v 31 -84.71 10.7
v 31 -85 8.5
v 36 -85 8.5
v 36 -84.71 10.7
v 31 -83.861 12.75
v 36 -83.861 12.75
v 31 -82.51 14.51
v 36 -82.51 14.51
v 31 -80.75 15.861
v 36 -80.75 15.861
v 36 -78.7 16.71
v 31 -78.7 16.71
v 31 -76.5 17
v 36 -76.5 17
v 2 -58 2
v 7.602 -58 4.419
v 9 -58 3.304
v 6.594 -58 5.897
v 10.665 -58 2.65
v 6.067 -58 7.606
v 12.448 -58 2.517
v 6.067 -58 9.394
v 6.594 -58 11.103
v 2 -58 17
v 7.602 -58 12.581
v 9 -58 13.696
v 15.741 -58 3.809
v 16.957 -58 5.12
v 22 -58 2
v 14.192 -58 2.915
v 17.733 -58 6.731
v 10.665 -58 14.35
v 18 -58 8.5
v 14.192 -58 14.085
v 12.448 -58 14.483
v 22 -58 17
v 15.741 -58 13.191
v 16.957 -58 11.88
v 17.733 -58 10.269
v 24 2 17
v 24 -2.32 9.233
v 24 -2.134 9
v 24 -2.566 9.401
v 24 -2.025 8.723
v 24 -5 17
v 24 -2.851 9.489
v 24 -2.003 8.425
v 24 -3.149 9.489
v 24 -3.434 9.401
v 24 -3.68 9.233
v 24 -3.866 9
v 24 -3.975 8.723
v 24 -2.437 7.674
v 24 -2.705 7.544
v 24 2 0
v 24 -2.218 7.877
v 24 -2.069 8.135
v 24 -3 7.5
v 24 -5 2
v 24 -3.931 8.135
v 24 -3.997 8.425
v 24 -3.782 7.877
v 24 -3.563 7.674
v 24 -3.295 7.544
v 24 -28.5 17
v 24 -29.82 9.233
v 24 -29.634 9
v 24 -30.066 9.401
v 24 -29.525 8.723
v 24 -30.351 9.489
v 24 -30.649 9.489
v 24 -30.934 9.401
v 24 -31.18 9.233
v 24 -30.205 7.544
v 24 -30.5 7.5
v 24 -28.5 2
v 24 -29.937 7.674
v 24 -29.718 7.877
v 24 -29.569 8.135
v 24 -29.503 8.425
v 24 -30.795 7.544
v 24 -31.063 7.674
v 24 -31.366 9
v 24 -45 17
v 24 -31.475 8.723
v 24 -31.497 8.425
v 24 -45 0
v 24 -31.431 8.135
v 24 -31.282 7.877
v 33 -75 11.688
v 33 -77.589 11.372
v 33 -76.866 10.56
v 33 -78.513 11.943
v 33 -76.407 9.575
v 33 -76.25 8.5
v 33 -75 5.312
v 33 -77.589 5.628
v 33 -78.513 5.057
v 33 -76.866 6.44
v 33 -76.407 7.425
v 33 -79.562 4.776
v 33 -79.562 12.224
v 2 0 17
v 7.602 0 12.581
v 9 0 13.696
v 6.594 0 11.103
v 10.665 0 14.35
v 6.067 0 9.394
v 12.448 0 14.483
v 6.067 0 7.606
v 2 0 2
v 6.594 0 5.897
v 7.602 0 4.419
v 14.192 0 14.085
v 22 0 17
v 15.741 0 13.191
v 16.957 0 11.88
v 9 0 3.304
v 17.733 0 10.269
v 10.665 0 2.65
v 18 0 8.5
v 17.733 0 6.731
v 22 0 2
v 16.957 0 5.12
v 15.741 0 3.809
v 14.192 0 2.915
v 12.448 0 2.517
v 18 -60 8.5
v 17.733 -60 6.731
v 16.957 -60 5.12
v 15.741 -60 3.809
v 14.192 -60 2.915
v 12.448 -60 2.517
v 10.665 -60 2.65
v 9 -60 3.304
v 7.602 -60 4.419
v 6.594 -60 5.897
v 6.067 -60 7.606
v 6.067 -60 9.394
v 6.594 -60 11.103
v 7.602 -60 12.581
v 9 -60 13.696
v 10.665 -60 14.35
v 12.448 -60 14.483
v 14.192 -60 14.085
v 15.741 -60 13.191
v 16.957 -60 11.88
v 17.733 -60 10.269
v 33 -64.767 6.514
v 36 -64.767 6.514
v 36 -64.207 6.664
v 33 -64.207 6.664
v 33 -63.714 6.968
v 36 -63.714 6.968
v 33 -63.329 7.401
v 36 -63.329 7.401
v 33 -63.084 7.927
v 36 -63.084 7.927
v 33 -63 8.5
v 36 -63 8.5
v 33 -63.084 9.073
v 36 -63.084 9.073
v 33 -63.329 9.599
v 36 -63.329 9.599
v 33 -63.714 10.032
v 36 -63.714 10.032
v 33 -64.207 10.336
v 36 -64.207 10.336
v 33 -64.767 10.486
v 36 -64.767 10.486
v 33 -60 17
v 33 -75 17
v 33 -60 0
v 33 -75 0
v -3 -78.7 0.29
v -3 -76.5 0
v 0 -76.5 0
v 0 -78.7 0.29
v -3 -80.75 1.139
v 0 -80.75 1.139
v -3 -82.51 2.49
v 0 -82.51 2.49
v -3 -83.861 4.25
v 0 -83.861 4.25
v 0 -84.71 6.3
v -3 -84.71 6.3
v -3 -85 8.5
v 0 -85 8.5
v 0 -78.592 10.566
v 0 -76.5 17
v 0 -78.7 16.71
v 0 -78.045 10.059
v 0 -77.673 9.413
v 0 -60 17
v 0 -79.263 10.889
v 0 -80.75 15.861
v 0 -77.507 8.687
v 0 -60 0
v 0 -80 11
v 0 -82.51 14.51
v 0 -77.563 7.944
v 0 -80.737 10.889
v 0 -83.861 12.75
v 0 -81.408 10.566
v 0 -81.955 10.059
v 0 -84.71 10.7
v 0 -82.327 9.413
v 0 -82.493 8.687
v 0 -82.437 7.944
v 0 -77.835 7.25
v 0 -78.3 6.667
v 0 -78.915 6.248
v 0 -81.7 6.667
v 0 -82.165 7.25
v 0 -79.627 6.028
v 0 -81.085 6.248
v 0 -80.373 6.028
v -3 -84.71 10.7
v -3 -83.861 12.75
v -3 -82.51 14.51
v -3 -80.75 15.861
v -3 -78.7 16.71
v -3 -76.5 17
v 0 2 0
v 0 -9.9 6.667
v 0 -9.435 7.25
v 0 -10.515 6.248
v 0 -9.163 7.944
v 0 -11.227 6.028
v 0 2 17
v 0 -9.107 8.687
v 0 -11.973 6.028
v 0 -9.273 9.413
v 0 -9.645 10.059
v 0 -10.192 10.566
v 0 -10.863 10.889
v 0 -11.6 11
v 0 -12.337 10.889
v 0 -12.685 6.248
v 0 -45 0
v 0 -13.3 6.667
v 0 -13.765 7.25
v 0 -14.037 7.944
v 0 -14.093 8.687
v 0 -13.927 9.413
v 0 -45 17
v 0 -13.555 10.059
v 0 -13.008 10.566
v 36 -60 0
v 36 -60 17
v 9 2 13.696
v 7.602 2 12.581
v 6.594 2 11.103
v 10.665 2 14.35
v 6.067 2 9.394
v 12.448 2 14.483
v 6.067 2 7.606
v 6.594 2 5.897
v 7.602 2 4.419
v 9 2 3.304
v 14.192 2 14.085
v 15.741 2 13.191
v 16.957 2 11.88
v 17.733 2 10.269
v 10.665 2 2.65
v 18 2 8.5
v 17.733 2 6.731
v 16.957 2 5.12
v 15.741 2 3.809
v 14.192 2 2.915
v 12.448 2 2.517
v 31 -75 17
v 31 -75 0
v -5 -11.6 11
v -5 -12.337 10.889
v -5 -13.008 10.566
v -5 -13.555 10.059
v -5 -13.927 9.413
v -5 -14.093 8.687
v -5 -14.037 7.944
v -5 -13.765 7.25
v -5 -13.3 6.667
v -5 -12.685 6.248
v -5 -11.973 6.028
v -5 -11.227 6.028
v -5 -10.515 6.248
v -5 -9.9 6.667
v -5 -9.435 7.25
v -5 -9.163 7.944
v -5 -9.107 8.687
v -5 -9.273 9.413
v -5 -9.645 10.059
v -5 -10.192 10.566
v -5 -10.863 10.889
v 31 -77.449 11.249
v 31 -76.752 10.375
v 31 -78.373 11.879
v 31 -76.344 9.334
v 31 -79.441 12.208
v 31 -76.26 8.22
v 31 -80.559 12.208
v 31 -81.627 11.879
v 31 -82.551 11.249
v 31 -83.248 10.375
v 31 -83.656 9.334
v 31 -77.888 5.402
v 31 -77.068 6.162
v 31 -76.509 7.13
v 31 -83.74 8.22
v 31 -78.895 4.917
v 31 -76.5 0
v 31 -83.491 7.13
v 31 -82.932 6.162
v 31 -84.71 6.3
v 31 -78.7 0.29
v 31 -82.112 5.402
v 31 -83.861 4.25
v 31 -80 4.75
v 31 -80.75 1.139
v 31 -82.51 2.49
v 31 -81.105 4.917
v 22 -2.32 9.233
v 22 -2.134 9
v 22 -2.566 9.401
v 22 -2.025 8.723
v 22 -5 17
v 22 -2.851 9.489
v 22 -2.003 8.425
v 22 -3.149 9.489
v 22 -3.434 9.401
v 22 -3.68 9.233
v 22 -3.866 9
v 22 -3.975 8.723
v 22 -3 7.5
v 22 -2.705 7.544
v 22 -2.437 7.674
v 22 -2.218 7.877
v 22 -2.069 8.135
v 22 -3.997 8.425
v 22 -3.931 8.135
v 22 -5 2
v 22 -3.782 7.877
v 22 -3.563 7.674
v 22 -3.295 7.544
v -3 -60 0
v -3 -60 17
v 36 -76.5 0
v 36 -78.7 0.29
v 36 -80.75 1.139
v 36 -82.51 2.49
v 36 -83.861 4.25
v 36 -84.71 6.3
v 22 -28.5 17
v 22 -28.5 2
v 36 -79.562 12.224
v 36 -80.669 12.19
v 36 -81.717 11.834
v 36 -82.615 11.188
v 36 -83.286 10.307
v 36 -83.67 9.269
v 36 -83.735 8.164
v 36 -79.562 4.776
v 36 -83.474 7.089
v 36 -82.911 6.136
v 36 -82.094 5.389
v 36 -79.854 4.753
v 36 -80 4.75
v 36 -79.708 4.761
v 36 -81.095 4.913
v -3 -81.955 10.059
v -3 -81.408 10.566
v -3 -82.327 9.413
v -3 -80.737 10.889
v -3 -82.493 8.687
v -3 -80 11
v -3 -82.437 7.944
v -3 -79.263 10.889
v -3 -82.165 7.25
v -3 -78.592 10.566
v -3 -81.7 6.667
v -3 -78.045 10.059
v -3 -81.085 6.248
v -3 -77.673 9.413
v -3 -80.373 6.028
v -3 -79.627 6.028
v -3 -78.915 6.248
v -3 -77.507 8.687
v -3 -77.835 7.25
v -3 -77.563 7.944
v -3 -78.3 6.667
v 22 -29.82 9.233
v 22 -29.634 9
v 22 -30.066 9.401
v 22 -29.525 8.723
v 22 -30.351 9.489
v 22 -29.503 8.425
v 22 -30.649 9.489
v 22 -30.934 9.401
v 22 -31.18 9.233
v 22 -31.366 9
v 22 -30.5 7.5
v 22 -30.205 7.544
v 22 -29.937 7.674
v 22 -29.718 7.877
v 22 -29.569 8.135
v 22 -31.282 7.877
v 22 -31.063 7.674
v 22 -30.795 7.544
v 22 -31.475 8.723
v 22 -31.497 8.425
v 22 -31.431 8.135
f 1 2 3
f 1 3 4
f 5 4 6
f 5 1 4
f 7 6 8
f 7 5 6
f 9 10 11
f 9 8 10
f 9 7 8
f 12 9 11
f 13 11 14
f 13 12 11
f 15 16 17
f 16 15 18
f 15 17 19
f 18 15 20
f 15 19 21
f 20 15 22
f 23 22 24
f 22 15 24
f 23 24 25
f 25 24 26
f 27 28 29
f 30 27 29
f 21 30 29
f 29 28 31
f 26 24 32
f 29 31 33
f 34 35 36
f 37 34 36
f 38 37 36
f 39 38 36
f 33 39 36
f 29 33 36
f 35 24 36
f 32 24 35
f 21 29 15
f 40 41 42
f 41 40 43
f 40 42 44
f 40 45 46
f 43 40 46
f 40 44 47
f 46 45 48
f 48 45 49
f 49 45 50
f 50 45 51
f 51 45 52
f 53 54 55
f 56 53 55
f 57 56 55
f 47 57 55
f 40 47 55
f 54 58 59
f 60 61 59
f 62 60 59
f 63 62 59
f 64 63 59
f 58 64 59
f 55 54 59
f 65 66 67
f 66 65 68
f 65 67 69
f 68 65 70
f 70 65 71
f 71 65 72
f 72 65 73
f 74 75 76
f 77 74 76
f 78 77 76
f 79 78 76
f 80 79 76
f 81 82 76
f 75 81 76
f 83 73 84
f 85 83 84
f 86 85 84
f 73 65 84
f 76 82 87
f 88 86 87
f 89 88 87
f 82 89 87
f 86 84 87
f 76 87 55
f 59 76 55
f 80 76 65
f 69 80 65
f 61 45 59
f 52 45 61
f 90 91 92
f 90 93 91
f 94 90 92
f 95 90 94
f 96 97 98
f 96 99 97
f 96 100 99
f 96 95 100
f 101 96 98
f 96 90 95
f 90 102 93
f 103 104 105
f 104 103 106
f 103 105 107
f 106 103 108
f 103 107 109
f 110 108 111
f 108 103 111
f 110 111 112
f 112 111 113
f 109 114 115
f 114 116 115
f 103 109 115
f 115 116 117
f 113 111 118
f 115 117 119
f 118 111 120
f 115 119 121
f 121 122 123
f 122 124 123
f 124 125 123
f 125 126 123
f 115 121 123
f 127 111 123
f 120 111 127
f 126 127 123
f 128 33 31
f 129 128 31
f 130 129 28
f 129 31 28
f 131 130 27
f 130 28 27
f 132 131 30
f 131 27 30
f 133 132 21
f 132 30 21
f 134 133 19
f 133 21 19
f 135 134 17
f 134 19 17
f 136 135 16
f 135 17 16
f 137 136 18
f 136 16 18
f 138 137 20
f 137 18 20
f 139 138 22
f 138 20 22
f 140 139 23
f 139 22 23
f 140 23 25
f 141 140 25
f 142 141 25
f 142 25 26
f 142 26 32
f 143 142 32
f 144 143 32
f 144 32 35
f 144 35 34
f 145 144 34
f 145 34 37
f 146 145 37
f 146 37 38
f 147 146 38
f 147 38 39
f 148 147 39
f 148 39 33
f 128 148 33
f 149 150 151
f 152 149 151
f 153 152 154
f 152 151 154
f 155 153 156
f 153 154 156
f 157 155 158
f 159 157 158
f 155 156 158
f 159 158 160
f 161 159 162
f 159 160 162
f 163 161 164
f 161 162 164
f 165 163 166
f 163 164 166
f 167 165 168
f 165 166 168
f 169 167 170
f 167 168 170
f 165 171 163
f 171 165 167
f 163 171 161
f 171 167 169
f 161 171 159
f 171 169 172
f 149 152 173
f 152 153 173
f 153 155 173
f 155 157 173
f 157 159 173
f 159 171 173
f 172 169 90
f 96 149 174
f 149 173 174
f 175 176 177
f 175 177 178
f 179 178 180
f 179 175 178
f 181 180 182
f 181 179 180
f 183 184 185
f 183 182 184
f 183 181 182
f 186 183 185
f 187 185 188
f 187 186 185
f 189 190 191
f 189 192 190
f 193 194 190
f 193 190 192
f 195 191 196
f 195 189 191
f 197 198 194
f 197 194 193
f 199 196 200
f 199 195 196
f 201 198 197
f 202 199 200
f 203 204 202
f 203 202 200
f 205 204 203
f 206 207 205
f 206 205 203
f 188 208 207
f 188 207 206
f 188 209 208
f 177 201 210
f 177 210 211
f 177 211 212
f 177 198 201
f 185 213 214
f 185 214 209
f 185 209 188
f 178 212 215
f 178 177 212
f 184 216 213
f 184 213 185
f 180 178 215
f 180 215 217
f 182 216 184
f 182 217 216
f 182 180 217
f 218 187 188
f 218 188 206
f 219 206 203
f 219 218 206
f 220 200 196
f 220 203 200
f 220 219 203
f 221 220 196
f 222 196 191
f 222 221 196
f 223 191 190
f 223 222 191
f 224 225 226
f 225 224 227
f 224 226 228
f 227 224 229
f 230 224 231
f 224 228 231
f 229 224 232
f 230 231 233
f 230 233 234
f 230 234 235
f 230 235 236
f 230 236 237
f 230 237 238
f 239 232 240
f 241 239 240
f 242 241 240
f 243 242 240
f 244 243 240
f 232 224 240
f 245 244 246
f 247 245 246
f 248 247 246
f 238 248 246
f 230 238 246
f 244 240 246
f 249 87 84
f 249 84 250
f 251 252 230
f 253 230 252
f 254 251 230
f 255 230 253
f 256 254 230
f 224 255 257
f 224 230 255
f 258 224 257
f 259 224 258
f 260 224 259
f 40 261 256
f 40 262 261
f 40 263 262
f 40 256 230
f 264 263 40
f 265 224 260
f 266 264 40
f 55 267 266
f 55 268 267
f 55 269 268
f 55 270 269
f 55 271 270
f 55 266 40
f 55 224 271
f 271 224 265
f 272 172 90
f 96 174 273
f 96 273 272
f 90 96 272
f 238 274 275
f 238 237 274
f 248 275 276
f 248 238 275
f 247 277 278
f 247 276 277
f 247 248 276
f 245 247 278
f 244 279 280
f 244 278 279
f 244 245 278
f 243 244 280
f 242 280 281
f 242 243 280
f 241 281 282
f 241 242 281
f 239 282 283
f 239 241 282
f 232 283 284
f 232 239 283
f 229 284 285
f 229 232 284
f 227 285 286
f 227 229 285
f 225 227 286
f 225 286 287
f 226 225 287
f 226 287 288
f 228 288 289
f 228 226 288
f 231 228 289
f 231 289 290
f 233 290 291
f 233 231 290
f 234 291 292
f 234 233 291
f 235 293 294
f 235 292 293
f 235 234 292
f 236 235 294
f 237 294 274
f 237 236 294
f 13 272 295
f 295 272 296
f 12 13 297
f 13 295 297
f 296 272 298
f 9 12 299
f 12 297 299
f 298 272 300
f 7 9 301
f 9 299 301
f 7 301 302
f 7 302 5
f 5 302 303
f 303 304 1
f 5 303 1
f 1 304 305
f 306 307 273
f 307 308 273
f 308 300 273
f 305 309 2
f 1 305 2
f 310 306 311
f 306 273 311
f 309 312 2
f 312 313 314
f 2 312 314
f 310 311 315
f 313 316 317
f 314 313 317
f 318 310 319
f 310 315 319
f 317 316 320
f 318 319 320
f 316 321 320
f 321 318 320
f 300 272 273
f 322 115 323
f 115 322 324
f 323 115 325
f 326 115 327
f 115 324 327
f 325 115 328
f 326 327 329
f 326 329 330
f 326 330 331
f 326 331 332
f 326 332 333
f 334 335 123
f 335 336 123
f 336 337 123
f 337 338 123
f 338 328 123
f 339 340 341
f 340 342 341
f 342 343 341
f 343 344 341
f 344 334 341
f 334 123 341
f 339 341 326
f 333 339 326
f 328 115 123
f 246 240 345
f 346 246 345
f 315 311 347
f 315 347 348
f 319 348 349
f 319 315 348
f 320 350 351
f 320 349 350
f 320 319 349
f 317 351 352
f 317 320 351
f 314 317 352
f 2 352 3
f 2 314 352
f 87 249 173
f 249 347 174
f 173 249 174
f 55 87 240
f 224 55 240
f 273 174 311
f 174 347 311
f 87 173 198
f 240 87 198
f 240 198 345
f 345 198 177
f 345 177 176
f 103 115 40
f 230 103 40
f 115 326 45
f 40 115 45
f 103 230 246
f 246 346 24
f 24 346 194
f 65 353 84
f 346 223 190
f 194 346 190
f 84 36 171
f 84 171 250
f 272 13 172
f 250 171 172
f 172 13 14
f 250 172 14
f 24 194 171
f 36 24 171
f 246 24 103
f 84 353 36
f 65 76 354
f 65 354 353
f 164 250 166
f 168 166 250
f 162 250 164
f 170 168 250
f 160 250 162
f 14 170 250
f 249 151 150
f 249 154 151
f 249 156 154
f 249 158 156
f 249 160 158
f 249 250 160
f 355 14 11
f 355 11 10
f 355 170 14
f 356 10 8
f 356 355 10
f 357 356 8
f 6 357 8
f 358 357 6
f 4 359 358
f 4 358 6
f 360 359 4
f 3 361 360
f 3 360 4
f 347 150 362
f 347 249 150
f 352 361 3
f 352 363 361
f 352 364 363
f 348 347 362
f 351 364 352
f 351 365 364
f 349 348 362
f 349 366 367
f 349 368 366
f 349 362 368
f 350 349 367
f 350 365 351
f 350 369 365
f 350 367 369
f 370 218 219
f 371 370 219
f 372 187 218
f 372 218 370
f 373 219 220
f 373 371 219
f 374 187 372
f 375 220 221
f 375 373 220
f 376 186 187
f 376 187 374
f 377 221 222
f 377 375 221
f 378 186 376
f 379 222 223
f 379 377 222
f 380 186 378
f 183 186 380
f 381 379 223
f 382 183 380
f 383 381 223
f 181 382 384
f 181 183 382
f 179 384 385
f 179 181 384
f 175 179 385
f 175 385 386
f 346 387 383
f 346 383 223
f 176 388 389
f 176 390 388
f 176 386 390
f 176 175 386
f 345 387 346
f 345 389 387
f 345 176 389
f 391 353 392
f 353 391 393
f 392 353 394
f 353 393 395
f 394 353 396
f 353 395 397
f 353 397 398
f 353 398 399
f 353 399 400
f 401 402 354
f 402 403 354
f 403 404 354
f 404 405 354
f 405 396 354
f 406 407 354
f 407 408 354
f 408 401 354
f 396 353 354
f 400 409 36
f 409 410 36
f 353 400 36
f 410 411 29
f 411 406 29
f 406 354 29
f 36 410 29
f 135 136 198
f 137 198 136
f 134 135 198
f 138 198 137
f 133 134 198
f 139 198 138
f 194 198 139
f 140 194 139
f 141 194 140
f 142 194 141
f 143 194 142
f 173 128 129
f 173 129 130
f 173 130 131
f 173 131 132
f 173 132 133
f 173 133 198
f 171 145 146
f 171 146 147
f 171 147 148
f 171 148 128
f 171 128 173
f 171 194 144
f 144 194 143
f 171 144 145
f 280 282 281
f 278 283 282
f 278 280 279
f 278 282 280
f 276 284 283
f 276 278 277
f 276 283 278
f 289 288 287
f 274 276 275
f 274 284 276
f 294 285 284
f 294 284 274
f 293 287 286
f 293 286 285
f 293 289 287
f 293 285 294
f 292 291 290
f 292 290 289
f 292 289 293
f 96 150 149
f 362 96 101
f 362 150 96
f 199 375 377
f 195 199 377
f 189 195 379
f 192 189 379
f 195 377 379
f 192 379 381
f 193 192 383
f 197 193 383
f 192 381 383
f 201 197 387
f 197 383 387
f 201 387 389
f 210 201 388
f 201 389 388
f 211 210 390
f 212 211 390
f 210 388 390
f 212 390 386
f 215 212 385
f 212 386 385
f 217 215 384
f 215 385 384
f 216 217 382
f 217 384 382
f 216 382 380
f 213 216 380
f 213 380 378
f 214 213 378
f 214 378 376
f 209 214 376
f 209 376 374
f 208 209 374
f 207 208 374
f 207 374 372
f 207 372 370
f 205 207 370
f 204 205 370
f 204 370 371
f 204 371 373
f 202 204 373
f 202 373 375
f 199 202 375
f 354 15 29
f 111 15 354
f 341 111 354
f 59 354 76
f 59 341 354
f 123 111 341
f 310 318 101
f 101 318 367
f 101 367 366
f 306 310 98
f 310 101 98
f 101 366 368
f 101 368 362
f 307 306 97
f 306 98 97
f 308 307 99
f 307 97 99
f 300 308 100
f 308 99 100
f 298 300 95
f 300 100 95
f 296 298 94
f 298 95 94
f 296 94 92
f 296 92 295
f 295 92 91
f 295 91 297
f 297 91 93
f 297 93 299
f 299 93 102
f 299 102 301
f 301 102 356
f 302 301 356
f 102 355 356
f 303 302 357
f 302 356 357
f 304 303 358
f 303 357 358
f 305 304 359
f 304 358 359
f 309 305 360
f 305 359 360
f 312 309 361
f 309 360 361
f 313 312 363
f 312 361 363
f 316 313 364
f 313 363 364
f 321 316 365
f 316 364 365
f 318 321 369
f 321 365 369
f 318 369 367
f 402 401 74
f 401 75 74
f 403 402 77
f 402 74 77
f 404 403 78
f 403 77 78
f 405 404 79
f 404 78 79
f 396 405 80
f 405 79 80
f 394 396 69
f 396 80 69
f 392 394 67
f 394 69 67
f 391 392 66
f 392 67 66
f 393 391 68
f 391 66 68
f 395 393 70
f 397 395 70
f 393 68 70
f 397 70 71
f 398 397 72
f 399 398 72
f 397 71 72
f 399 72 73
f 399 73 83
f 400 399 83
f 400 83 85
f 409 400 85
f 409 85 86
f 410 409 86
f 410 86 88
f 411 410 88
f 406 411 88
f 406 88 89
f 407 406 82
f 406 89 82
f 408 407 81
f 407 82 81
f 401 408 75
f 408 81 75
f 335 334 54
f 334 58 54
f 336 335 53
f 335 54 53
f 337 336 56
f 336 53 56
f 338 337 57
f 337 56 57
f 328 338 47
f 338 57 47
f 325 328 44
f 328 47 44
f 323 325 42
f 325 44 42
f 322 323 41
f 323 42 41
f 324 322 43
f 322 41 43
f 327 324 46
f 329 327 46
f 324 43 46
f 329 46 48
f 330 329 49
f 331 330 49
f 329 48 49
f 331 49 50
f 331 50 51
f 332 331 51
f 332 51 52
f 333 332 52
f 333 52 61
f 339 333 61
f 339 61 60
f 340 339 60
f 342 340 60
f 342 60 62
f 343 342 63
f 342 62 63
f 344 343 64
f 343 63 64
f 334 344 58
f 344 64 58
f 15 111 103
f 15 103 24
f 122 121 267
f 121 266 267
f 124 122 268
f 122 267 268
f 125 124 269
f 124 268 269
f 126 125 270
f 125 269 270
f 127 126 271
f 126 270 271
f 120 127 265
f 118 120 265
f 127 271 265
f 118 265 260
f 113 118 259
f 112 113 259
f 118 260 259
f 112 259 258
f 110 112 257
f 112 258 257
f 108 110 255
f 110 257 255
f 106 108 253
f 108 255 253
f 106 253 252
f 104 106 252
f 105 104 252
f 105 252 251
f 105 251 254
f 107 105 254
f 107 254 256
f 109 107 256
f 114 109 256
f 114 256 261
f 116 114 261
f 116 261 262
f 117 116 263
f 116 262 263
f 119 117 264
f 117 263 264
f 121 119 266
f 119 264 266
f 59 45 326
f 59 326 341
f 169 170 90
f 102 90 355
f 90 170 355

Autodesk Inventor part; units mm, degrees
ref_plane "YZ Plane" through (0, 0, 0) normal (1, 0, 0) x (0, 1, 0)
ref_plane "XZ Plane" through (0, 0, 0) normal (0, 1, 0) x (-1, 0, 0)
ref_plane "XY Plane" through (0, 0, 0) normal (0, 0, 1) x (1, 0, 0)
sketch "Sketch1" plane through (0, 0, 0) normal (0, 0, 1) x (1, 0, 0)
  line L0 (0, 0) -> (24, 0)
  line L1 (24, 0) -> (24, -60)
  line L2 (24, -60) -> (0, -60)
  line L3 (0, -60) -> (0, 0)
  dimension "d0" = 24
  dimension "d1" = 60
extrude "Extrusion1" add sketch "Sketch1" along normal blind 2
sketch "Sketch2" plane through (0, 0, 2) normal (0, 0, 1) x (1, 0, 0)
  line L0 (0, -60) -> (24, -60) projected
  line L1 (0, 0) -> (2, 0)
  line L2 (2, 0) -> (2, -60)
  line L3 (2, -60) -> (0, -60)
  line L4 (0, -60) -> (0, 0)
  line L5 (24, -60) -> (24, 0) projected
  line L6 (24, 0) -> (22, 0)
  line L7 (22, 0) -> (22, -60)
  line L8 (22, -60) -> (24, -60)
  line L9 (24, -60) -> (24, 0)
  dimension "d4" = 2
  dimension "d5" = 2
extrude "Extrusion2" add sketch "Sketch2" along normal blind 15
sketch "Sketch3" plane through (24, -60, 0) normal (1, 0, 0) x (0, 0, -1)
  circle A0 centre (-8.5, 57) radius 1
  circle A1 centre (-8.5, 29.5) radius 1
  line L0 (-17, 0) -> (-17, 60) projected
  line L1 (0, 60) -> (-17, 60) projected
  dimension "d8" = 2
  dimension "d9" = 2
  dimension "d10" = 8.5
  dimension "d11" = 8.5
  dimension "d12" = 27.5
  dimension "d13" = 3
extrude "Extrusion3" cut sketch "Sketch3" against normal up to surface (2 mm away)
sketch "Sketch4" plane through (24, -60, 0) normal (1, 0, 0) x (0, 0, -1)
  line L0 (-17, 60) -> (-17, 0) projected
  line L1 (-17, 55) -> (-2, 55)
  line L2 (-2, 55) -> (-2, 31.5)
  line L3 (-2, 31.5) -> (-17, 31.5)
  line L4 (-17, 31.5) -> (-17, 55)
  circle A0 centre (-8.5, 57) radius 1 projected
  circle A1 centre (-8.5, 29.5) radius 1 projected
  point P0 (-17, 31.5)
  dimension "d23" = 15
  dimension "d24" = 23.5
  dimension "d25" = 2
  dimension "d26" = 2
extrude "Extrusion4" cut sketch "Sketch4" against normal up to surface (2 mm away) contours L1 L2 L3 L0
sketch "Sketch5" plane through (0, -60, 0) normal (-1, 0, 0) x (0, 0, 1)
  circle A0 centre (8.5, 48.4) radius 2.5
  circle A1 centre (8.5, 57) radius 1 projected
  point P0 (0, 60)
  dimension "d29" = 5
  dimension "d32" = 8.6
  dimension "d33" = 0
extrude "Extrusion5" add sketch "Sketch5" along normal blind 5 contours A0
sketch "Sketch12" plane through (0, 0, 0) normal (0, 0, -1) x (-1, 0, 0)
  line L0 (3, -60) -> (-36, -60)
  line L1 (-36, -60) -> (-36, -85)
  line L2 (-36, -85) -> (3, -85)
  line L3 (3, -85) -> (3, -60)
  line L4 (0, 0) -> (0, -60) projected
  line L5 (-2, -60) -> (-22, -60) projected
  line L6 (3, -60) -> (0, -60)
  line L7 (0, -60) -> (0, -85)
  line L8 (0, -85) -> (3, -85)
  line L9 (3, -85) -> (3, -60)
  line L10 (-36, -60) -> (-31, -60)
  line L11 (-31, -60) -> (-31, -85)
  line L12 (-31, -85) -> (-36, -85)
  line L13 (-36, -85) -> (-36, -60)
  line L14 (-31, -60) -> (-33, -60)
  line L15 (-33, -60) -> (-33, -75)
  line L16 (-33, -75) -> (-31, -75)
  line L17 (-31, -75) -> (-31, -60)
  dimension "d52" = 3
  dimension "d53" = 25
  dimension "d54" = 0
  dimension "d55" = 3
  dimension "d56" = 5
  dimension "d83" = 31
  dimension "d92" = 2
  dimension "d93" = 15
extrude "Extrusion9" add sketch "Sketch12" against normal up to surface (17 mm away) contours L3 L2 L7 L0 | L2 L1 L0 L15 L16 L11
sketch "Sketch13" plane through (0, 0, 0) normal (0, 0, -1) x (-1, 0, 0)
  line L0 (-33, -60) -> (-36, -60) projected
  line L1 (0, -60) -> (-24, -60) projected
  line L2 (-36, -60) -> (-24, -60)
  line L3 (-24, -60) -> (-24, -45)
  line L4 (-24, -45) -> (-36, -60)
  line L5 (0, -60) -> (0, -45)
  line L6 (0, 0) -> (0, -60) projected
  line L7 (0, -60) -> (15, -60) construction
  line L8 (0, -45) -> (3, -60)
  line L9 (3, -60) -> (0, -60)
  point P0 (-31, -60)
  dimension "d59" = 15
  dimension "d60" = 90
  dimension "d63" = 15
  dimension "d64" = 90
extrude "Extrusion10" add sketch "Sketch13" against normal up to surface (17 mm away)
sketch "Sketch14" plane through (-3, -85, 0) normal (-1, 0, 0) x (0, 0, 1)
  circle A0 centre (8.5, 5) radius 2.5
  line L0 (17, 0) -> (17, 25) projected
  line L1 (0, 25) -> (17, 25) projected
  point P0 (0, 85)
  dimension "d65" = 5
  dimension "d66" = 8.5
  dimension "d67" = 20
extrude "Extrusion11" cut sketch "Sketch14" against normal up to surface (39 mm away)
sketch "Sketch15" plane through (0, 0, 0) normal (0, 1, 0) x (1, 0, 0)
  line L0 (24, -17) -> (24, 0) projected
  line L1 (2, -17) -> (0, -17) projected
  line L2 (24, 0) -> (0, 0)
  line L3 (0, 0) -> (0, -17)
  line L4 (0, -17) -> (24, -17)
  line L5 (24, -17) -> (24, 0)
extrude "Extrusion12" add sketch "Sketch15" along normal blind 2
sketch "Sketch16" plane through (2, -60, 2) normal (0, -1, 0) x (1, 0, 0)
  line L0 (0, 15) -> (20, 15) projected
  line L1 (0, 0) -> (20, 0) projected
  line L2 (0, 15) -> (20, 15)
  line L3 (20, 15) -> (20, 0)
  line L4 (20, 0) -> (0, 0)
  line L5 (0, 0) -> (0, 15)
  point P0 (-2, -2)
  point P1 (20, 15)
extrude "Extrusion13" add sketch "Sketch16" against normal blind 2
sketch "Sketch17" plane through (0, 2, 0) normal (0, 1, 0) x (1, 0, 0)
  circle A0 centre (12, -8.5) radius 6
  line L0 (24, -17) -> (24, 0) projected
  line L1 (24, 0) -> (0, 0) projected
  dimension "d74" = 12
  dimension "d75" = 12
  dimension "d76" = 8.5
extrude "Extrusion14" cut sketch "Sketch17" against normal up to surface (62 mm away)
fillet "Fillet2" radius 8.5 4 edges at (33.5, -85, 0) (-1.5, -85, 0) (33.5, -85, 17) (-1.5, -85, 17)
sketch "Sketch18" plane through (36, -60, 17) normal (1, 0, 0) x (0, 0, -1)
  circle A0 centre (8.5, -20) radius 2.5 projected
  circle A1 centre (8.5, -20) radius 3.75
  point P0 (17, 60)
  dimension "d80" = 7.5
extrude "Extrusion15" cut sketch "Sketch18" against normal up to surface (5 mm away) contours A0 | A1
sketch "Sketch20" plane through (36, -60, 17) normal (1, 0, 0) x (0, 0, -1)
  circle A0 centre (8.5, -5) radius 2
  circle A1 centre (8.5, -20) radius 3.75 projected
  line L0 (10.4863, -4.7667) -> (12.2244, -19.5625)
  line L1 (6.5137, -4.7667) -> (4.7756, -19.5625)
  circle A2 centre (8.5, -5) radius 2
  circle A3 centre (8.5, -20) radius 3.75
  line L2 (10.4863, -4.7667) -> (12.2244, -19.5625)
  line L3 (6.5137, -4.7667) -> (4.7756, -19.5625)
  point P0 (17, 60)
  dimension "d84" = 4
  dimension "d85" = 15
  dimension "d86" = 0
  dimension "d89" = 4
  dimension "d90" = 15
  dimension "d91" = 0
extrude "Extrusion16" cut sketch "Sketch20" against normal blind 3 contours A0 | A0 L0 A1 L1
properties part number "juncao2"
